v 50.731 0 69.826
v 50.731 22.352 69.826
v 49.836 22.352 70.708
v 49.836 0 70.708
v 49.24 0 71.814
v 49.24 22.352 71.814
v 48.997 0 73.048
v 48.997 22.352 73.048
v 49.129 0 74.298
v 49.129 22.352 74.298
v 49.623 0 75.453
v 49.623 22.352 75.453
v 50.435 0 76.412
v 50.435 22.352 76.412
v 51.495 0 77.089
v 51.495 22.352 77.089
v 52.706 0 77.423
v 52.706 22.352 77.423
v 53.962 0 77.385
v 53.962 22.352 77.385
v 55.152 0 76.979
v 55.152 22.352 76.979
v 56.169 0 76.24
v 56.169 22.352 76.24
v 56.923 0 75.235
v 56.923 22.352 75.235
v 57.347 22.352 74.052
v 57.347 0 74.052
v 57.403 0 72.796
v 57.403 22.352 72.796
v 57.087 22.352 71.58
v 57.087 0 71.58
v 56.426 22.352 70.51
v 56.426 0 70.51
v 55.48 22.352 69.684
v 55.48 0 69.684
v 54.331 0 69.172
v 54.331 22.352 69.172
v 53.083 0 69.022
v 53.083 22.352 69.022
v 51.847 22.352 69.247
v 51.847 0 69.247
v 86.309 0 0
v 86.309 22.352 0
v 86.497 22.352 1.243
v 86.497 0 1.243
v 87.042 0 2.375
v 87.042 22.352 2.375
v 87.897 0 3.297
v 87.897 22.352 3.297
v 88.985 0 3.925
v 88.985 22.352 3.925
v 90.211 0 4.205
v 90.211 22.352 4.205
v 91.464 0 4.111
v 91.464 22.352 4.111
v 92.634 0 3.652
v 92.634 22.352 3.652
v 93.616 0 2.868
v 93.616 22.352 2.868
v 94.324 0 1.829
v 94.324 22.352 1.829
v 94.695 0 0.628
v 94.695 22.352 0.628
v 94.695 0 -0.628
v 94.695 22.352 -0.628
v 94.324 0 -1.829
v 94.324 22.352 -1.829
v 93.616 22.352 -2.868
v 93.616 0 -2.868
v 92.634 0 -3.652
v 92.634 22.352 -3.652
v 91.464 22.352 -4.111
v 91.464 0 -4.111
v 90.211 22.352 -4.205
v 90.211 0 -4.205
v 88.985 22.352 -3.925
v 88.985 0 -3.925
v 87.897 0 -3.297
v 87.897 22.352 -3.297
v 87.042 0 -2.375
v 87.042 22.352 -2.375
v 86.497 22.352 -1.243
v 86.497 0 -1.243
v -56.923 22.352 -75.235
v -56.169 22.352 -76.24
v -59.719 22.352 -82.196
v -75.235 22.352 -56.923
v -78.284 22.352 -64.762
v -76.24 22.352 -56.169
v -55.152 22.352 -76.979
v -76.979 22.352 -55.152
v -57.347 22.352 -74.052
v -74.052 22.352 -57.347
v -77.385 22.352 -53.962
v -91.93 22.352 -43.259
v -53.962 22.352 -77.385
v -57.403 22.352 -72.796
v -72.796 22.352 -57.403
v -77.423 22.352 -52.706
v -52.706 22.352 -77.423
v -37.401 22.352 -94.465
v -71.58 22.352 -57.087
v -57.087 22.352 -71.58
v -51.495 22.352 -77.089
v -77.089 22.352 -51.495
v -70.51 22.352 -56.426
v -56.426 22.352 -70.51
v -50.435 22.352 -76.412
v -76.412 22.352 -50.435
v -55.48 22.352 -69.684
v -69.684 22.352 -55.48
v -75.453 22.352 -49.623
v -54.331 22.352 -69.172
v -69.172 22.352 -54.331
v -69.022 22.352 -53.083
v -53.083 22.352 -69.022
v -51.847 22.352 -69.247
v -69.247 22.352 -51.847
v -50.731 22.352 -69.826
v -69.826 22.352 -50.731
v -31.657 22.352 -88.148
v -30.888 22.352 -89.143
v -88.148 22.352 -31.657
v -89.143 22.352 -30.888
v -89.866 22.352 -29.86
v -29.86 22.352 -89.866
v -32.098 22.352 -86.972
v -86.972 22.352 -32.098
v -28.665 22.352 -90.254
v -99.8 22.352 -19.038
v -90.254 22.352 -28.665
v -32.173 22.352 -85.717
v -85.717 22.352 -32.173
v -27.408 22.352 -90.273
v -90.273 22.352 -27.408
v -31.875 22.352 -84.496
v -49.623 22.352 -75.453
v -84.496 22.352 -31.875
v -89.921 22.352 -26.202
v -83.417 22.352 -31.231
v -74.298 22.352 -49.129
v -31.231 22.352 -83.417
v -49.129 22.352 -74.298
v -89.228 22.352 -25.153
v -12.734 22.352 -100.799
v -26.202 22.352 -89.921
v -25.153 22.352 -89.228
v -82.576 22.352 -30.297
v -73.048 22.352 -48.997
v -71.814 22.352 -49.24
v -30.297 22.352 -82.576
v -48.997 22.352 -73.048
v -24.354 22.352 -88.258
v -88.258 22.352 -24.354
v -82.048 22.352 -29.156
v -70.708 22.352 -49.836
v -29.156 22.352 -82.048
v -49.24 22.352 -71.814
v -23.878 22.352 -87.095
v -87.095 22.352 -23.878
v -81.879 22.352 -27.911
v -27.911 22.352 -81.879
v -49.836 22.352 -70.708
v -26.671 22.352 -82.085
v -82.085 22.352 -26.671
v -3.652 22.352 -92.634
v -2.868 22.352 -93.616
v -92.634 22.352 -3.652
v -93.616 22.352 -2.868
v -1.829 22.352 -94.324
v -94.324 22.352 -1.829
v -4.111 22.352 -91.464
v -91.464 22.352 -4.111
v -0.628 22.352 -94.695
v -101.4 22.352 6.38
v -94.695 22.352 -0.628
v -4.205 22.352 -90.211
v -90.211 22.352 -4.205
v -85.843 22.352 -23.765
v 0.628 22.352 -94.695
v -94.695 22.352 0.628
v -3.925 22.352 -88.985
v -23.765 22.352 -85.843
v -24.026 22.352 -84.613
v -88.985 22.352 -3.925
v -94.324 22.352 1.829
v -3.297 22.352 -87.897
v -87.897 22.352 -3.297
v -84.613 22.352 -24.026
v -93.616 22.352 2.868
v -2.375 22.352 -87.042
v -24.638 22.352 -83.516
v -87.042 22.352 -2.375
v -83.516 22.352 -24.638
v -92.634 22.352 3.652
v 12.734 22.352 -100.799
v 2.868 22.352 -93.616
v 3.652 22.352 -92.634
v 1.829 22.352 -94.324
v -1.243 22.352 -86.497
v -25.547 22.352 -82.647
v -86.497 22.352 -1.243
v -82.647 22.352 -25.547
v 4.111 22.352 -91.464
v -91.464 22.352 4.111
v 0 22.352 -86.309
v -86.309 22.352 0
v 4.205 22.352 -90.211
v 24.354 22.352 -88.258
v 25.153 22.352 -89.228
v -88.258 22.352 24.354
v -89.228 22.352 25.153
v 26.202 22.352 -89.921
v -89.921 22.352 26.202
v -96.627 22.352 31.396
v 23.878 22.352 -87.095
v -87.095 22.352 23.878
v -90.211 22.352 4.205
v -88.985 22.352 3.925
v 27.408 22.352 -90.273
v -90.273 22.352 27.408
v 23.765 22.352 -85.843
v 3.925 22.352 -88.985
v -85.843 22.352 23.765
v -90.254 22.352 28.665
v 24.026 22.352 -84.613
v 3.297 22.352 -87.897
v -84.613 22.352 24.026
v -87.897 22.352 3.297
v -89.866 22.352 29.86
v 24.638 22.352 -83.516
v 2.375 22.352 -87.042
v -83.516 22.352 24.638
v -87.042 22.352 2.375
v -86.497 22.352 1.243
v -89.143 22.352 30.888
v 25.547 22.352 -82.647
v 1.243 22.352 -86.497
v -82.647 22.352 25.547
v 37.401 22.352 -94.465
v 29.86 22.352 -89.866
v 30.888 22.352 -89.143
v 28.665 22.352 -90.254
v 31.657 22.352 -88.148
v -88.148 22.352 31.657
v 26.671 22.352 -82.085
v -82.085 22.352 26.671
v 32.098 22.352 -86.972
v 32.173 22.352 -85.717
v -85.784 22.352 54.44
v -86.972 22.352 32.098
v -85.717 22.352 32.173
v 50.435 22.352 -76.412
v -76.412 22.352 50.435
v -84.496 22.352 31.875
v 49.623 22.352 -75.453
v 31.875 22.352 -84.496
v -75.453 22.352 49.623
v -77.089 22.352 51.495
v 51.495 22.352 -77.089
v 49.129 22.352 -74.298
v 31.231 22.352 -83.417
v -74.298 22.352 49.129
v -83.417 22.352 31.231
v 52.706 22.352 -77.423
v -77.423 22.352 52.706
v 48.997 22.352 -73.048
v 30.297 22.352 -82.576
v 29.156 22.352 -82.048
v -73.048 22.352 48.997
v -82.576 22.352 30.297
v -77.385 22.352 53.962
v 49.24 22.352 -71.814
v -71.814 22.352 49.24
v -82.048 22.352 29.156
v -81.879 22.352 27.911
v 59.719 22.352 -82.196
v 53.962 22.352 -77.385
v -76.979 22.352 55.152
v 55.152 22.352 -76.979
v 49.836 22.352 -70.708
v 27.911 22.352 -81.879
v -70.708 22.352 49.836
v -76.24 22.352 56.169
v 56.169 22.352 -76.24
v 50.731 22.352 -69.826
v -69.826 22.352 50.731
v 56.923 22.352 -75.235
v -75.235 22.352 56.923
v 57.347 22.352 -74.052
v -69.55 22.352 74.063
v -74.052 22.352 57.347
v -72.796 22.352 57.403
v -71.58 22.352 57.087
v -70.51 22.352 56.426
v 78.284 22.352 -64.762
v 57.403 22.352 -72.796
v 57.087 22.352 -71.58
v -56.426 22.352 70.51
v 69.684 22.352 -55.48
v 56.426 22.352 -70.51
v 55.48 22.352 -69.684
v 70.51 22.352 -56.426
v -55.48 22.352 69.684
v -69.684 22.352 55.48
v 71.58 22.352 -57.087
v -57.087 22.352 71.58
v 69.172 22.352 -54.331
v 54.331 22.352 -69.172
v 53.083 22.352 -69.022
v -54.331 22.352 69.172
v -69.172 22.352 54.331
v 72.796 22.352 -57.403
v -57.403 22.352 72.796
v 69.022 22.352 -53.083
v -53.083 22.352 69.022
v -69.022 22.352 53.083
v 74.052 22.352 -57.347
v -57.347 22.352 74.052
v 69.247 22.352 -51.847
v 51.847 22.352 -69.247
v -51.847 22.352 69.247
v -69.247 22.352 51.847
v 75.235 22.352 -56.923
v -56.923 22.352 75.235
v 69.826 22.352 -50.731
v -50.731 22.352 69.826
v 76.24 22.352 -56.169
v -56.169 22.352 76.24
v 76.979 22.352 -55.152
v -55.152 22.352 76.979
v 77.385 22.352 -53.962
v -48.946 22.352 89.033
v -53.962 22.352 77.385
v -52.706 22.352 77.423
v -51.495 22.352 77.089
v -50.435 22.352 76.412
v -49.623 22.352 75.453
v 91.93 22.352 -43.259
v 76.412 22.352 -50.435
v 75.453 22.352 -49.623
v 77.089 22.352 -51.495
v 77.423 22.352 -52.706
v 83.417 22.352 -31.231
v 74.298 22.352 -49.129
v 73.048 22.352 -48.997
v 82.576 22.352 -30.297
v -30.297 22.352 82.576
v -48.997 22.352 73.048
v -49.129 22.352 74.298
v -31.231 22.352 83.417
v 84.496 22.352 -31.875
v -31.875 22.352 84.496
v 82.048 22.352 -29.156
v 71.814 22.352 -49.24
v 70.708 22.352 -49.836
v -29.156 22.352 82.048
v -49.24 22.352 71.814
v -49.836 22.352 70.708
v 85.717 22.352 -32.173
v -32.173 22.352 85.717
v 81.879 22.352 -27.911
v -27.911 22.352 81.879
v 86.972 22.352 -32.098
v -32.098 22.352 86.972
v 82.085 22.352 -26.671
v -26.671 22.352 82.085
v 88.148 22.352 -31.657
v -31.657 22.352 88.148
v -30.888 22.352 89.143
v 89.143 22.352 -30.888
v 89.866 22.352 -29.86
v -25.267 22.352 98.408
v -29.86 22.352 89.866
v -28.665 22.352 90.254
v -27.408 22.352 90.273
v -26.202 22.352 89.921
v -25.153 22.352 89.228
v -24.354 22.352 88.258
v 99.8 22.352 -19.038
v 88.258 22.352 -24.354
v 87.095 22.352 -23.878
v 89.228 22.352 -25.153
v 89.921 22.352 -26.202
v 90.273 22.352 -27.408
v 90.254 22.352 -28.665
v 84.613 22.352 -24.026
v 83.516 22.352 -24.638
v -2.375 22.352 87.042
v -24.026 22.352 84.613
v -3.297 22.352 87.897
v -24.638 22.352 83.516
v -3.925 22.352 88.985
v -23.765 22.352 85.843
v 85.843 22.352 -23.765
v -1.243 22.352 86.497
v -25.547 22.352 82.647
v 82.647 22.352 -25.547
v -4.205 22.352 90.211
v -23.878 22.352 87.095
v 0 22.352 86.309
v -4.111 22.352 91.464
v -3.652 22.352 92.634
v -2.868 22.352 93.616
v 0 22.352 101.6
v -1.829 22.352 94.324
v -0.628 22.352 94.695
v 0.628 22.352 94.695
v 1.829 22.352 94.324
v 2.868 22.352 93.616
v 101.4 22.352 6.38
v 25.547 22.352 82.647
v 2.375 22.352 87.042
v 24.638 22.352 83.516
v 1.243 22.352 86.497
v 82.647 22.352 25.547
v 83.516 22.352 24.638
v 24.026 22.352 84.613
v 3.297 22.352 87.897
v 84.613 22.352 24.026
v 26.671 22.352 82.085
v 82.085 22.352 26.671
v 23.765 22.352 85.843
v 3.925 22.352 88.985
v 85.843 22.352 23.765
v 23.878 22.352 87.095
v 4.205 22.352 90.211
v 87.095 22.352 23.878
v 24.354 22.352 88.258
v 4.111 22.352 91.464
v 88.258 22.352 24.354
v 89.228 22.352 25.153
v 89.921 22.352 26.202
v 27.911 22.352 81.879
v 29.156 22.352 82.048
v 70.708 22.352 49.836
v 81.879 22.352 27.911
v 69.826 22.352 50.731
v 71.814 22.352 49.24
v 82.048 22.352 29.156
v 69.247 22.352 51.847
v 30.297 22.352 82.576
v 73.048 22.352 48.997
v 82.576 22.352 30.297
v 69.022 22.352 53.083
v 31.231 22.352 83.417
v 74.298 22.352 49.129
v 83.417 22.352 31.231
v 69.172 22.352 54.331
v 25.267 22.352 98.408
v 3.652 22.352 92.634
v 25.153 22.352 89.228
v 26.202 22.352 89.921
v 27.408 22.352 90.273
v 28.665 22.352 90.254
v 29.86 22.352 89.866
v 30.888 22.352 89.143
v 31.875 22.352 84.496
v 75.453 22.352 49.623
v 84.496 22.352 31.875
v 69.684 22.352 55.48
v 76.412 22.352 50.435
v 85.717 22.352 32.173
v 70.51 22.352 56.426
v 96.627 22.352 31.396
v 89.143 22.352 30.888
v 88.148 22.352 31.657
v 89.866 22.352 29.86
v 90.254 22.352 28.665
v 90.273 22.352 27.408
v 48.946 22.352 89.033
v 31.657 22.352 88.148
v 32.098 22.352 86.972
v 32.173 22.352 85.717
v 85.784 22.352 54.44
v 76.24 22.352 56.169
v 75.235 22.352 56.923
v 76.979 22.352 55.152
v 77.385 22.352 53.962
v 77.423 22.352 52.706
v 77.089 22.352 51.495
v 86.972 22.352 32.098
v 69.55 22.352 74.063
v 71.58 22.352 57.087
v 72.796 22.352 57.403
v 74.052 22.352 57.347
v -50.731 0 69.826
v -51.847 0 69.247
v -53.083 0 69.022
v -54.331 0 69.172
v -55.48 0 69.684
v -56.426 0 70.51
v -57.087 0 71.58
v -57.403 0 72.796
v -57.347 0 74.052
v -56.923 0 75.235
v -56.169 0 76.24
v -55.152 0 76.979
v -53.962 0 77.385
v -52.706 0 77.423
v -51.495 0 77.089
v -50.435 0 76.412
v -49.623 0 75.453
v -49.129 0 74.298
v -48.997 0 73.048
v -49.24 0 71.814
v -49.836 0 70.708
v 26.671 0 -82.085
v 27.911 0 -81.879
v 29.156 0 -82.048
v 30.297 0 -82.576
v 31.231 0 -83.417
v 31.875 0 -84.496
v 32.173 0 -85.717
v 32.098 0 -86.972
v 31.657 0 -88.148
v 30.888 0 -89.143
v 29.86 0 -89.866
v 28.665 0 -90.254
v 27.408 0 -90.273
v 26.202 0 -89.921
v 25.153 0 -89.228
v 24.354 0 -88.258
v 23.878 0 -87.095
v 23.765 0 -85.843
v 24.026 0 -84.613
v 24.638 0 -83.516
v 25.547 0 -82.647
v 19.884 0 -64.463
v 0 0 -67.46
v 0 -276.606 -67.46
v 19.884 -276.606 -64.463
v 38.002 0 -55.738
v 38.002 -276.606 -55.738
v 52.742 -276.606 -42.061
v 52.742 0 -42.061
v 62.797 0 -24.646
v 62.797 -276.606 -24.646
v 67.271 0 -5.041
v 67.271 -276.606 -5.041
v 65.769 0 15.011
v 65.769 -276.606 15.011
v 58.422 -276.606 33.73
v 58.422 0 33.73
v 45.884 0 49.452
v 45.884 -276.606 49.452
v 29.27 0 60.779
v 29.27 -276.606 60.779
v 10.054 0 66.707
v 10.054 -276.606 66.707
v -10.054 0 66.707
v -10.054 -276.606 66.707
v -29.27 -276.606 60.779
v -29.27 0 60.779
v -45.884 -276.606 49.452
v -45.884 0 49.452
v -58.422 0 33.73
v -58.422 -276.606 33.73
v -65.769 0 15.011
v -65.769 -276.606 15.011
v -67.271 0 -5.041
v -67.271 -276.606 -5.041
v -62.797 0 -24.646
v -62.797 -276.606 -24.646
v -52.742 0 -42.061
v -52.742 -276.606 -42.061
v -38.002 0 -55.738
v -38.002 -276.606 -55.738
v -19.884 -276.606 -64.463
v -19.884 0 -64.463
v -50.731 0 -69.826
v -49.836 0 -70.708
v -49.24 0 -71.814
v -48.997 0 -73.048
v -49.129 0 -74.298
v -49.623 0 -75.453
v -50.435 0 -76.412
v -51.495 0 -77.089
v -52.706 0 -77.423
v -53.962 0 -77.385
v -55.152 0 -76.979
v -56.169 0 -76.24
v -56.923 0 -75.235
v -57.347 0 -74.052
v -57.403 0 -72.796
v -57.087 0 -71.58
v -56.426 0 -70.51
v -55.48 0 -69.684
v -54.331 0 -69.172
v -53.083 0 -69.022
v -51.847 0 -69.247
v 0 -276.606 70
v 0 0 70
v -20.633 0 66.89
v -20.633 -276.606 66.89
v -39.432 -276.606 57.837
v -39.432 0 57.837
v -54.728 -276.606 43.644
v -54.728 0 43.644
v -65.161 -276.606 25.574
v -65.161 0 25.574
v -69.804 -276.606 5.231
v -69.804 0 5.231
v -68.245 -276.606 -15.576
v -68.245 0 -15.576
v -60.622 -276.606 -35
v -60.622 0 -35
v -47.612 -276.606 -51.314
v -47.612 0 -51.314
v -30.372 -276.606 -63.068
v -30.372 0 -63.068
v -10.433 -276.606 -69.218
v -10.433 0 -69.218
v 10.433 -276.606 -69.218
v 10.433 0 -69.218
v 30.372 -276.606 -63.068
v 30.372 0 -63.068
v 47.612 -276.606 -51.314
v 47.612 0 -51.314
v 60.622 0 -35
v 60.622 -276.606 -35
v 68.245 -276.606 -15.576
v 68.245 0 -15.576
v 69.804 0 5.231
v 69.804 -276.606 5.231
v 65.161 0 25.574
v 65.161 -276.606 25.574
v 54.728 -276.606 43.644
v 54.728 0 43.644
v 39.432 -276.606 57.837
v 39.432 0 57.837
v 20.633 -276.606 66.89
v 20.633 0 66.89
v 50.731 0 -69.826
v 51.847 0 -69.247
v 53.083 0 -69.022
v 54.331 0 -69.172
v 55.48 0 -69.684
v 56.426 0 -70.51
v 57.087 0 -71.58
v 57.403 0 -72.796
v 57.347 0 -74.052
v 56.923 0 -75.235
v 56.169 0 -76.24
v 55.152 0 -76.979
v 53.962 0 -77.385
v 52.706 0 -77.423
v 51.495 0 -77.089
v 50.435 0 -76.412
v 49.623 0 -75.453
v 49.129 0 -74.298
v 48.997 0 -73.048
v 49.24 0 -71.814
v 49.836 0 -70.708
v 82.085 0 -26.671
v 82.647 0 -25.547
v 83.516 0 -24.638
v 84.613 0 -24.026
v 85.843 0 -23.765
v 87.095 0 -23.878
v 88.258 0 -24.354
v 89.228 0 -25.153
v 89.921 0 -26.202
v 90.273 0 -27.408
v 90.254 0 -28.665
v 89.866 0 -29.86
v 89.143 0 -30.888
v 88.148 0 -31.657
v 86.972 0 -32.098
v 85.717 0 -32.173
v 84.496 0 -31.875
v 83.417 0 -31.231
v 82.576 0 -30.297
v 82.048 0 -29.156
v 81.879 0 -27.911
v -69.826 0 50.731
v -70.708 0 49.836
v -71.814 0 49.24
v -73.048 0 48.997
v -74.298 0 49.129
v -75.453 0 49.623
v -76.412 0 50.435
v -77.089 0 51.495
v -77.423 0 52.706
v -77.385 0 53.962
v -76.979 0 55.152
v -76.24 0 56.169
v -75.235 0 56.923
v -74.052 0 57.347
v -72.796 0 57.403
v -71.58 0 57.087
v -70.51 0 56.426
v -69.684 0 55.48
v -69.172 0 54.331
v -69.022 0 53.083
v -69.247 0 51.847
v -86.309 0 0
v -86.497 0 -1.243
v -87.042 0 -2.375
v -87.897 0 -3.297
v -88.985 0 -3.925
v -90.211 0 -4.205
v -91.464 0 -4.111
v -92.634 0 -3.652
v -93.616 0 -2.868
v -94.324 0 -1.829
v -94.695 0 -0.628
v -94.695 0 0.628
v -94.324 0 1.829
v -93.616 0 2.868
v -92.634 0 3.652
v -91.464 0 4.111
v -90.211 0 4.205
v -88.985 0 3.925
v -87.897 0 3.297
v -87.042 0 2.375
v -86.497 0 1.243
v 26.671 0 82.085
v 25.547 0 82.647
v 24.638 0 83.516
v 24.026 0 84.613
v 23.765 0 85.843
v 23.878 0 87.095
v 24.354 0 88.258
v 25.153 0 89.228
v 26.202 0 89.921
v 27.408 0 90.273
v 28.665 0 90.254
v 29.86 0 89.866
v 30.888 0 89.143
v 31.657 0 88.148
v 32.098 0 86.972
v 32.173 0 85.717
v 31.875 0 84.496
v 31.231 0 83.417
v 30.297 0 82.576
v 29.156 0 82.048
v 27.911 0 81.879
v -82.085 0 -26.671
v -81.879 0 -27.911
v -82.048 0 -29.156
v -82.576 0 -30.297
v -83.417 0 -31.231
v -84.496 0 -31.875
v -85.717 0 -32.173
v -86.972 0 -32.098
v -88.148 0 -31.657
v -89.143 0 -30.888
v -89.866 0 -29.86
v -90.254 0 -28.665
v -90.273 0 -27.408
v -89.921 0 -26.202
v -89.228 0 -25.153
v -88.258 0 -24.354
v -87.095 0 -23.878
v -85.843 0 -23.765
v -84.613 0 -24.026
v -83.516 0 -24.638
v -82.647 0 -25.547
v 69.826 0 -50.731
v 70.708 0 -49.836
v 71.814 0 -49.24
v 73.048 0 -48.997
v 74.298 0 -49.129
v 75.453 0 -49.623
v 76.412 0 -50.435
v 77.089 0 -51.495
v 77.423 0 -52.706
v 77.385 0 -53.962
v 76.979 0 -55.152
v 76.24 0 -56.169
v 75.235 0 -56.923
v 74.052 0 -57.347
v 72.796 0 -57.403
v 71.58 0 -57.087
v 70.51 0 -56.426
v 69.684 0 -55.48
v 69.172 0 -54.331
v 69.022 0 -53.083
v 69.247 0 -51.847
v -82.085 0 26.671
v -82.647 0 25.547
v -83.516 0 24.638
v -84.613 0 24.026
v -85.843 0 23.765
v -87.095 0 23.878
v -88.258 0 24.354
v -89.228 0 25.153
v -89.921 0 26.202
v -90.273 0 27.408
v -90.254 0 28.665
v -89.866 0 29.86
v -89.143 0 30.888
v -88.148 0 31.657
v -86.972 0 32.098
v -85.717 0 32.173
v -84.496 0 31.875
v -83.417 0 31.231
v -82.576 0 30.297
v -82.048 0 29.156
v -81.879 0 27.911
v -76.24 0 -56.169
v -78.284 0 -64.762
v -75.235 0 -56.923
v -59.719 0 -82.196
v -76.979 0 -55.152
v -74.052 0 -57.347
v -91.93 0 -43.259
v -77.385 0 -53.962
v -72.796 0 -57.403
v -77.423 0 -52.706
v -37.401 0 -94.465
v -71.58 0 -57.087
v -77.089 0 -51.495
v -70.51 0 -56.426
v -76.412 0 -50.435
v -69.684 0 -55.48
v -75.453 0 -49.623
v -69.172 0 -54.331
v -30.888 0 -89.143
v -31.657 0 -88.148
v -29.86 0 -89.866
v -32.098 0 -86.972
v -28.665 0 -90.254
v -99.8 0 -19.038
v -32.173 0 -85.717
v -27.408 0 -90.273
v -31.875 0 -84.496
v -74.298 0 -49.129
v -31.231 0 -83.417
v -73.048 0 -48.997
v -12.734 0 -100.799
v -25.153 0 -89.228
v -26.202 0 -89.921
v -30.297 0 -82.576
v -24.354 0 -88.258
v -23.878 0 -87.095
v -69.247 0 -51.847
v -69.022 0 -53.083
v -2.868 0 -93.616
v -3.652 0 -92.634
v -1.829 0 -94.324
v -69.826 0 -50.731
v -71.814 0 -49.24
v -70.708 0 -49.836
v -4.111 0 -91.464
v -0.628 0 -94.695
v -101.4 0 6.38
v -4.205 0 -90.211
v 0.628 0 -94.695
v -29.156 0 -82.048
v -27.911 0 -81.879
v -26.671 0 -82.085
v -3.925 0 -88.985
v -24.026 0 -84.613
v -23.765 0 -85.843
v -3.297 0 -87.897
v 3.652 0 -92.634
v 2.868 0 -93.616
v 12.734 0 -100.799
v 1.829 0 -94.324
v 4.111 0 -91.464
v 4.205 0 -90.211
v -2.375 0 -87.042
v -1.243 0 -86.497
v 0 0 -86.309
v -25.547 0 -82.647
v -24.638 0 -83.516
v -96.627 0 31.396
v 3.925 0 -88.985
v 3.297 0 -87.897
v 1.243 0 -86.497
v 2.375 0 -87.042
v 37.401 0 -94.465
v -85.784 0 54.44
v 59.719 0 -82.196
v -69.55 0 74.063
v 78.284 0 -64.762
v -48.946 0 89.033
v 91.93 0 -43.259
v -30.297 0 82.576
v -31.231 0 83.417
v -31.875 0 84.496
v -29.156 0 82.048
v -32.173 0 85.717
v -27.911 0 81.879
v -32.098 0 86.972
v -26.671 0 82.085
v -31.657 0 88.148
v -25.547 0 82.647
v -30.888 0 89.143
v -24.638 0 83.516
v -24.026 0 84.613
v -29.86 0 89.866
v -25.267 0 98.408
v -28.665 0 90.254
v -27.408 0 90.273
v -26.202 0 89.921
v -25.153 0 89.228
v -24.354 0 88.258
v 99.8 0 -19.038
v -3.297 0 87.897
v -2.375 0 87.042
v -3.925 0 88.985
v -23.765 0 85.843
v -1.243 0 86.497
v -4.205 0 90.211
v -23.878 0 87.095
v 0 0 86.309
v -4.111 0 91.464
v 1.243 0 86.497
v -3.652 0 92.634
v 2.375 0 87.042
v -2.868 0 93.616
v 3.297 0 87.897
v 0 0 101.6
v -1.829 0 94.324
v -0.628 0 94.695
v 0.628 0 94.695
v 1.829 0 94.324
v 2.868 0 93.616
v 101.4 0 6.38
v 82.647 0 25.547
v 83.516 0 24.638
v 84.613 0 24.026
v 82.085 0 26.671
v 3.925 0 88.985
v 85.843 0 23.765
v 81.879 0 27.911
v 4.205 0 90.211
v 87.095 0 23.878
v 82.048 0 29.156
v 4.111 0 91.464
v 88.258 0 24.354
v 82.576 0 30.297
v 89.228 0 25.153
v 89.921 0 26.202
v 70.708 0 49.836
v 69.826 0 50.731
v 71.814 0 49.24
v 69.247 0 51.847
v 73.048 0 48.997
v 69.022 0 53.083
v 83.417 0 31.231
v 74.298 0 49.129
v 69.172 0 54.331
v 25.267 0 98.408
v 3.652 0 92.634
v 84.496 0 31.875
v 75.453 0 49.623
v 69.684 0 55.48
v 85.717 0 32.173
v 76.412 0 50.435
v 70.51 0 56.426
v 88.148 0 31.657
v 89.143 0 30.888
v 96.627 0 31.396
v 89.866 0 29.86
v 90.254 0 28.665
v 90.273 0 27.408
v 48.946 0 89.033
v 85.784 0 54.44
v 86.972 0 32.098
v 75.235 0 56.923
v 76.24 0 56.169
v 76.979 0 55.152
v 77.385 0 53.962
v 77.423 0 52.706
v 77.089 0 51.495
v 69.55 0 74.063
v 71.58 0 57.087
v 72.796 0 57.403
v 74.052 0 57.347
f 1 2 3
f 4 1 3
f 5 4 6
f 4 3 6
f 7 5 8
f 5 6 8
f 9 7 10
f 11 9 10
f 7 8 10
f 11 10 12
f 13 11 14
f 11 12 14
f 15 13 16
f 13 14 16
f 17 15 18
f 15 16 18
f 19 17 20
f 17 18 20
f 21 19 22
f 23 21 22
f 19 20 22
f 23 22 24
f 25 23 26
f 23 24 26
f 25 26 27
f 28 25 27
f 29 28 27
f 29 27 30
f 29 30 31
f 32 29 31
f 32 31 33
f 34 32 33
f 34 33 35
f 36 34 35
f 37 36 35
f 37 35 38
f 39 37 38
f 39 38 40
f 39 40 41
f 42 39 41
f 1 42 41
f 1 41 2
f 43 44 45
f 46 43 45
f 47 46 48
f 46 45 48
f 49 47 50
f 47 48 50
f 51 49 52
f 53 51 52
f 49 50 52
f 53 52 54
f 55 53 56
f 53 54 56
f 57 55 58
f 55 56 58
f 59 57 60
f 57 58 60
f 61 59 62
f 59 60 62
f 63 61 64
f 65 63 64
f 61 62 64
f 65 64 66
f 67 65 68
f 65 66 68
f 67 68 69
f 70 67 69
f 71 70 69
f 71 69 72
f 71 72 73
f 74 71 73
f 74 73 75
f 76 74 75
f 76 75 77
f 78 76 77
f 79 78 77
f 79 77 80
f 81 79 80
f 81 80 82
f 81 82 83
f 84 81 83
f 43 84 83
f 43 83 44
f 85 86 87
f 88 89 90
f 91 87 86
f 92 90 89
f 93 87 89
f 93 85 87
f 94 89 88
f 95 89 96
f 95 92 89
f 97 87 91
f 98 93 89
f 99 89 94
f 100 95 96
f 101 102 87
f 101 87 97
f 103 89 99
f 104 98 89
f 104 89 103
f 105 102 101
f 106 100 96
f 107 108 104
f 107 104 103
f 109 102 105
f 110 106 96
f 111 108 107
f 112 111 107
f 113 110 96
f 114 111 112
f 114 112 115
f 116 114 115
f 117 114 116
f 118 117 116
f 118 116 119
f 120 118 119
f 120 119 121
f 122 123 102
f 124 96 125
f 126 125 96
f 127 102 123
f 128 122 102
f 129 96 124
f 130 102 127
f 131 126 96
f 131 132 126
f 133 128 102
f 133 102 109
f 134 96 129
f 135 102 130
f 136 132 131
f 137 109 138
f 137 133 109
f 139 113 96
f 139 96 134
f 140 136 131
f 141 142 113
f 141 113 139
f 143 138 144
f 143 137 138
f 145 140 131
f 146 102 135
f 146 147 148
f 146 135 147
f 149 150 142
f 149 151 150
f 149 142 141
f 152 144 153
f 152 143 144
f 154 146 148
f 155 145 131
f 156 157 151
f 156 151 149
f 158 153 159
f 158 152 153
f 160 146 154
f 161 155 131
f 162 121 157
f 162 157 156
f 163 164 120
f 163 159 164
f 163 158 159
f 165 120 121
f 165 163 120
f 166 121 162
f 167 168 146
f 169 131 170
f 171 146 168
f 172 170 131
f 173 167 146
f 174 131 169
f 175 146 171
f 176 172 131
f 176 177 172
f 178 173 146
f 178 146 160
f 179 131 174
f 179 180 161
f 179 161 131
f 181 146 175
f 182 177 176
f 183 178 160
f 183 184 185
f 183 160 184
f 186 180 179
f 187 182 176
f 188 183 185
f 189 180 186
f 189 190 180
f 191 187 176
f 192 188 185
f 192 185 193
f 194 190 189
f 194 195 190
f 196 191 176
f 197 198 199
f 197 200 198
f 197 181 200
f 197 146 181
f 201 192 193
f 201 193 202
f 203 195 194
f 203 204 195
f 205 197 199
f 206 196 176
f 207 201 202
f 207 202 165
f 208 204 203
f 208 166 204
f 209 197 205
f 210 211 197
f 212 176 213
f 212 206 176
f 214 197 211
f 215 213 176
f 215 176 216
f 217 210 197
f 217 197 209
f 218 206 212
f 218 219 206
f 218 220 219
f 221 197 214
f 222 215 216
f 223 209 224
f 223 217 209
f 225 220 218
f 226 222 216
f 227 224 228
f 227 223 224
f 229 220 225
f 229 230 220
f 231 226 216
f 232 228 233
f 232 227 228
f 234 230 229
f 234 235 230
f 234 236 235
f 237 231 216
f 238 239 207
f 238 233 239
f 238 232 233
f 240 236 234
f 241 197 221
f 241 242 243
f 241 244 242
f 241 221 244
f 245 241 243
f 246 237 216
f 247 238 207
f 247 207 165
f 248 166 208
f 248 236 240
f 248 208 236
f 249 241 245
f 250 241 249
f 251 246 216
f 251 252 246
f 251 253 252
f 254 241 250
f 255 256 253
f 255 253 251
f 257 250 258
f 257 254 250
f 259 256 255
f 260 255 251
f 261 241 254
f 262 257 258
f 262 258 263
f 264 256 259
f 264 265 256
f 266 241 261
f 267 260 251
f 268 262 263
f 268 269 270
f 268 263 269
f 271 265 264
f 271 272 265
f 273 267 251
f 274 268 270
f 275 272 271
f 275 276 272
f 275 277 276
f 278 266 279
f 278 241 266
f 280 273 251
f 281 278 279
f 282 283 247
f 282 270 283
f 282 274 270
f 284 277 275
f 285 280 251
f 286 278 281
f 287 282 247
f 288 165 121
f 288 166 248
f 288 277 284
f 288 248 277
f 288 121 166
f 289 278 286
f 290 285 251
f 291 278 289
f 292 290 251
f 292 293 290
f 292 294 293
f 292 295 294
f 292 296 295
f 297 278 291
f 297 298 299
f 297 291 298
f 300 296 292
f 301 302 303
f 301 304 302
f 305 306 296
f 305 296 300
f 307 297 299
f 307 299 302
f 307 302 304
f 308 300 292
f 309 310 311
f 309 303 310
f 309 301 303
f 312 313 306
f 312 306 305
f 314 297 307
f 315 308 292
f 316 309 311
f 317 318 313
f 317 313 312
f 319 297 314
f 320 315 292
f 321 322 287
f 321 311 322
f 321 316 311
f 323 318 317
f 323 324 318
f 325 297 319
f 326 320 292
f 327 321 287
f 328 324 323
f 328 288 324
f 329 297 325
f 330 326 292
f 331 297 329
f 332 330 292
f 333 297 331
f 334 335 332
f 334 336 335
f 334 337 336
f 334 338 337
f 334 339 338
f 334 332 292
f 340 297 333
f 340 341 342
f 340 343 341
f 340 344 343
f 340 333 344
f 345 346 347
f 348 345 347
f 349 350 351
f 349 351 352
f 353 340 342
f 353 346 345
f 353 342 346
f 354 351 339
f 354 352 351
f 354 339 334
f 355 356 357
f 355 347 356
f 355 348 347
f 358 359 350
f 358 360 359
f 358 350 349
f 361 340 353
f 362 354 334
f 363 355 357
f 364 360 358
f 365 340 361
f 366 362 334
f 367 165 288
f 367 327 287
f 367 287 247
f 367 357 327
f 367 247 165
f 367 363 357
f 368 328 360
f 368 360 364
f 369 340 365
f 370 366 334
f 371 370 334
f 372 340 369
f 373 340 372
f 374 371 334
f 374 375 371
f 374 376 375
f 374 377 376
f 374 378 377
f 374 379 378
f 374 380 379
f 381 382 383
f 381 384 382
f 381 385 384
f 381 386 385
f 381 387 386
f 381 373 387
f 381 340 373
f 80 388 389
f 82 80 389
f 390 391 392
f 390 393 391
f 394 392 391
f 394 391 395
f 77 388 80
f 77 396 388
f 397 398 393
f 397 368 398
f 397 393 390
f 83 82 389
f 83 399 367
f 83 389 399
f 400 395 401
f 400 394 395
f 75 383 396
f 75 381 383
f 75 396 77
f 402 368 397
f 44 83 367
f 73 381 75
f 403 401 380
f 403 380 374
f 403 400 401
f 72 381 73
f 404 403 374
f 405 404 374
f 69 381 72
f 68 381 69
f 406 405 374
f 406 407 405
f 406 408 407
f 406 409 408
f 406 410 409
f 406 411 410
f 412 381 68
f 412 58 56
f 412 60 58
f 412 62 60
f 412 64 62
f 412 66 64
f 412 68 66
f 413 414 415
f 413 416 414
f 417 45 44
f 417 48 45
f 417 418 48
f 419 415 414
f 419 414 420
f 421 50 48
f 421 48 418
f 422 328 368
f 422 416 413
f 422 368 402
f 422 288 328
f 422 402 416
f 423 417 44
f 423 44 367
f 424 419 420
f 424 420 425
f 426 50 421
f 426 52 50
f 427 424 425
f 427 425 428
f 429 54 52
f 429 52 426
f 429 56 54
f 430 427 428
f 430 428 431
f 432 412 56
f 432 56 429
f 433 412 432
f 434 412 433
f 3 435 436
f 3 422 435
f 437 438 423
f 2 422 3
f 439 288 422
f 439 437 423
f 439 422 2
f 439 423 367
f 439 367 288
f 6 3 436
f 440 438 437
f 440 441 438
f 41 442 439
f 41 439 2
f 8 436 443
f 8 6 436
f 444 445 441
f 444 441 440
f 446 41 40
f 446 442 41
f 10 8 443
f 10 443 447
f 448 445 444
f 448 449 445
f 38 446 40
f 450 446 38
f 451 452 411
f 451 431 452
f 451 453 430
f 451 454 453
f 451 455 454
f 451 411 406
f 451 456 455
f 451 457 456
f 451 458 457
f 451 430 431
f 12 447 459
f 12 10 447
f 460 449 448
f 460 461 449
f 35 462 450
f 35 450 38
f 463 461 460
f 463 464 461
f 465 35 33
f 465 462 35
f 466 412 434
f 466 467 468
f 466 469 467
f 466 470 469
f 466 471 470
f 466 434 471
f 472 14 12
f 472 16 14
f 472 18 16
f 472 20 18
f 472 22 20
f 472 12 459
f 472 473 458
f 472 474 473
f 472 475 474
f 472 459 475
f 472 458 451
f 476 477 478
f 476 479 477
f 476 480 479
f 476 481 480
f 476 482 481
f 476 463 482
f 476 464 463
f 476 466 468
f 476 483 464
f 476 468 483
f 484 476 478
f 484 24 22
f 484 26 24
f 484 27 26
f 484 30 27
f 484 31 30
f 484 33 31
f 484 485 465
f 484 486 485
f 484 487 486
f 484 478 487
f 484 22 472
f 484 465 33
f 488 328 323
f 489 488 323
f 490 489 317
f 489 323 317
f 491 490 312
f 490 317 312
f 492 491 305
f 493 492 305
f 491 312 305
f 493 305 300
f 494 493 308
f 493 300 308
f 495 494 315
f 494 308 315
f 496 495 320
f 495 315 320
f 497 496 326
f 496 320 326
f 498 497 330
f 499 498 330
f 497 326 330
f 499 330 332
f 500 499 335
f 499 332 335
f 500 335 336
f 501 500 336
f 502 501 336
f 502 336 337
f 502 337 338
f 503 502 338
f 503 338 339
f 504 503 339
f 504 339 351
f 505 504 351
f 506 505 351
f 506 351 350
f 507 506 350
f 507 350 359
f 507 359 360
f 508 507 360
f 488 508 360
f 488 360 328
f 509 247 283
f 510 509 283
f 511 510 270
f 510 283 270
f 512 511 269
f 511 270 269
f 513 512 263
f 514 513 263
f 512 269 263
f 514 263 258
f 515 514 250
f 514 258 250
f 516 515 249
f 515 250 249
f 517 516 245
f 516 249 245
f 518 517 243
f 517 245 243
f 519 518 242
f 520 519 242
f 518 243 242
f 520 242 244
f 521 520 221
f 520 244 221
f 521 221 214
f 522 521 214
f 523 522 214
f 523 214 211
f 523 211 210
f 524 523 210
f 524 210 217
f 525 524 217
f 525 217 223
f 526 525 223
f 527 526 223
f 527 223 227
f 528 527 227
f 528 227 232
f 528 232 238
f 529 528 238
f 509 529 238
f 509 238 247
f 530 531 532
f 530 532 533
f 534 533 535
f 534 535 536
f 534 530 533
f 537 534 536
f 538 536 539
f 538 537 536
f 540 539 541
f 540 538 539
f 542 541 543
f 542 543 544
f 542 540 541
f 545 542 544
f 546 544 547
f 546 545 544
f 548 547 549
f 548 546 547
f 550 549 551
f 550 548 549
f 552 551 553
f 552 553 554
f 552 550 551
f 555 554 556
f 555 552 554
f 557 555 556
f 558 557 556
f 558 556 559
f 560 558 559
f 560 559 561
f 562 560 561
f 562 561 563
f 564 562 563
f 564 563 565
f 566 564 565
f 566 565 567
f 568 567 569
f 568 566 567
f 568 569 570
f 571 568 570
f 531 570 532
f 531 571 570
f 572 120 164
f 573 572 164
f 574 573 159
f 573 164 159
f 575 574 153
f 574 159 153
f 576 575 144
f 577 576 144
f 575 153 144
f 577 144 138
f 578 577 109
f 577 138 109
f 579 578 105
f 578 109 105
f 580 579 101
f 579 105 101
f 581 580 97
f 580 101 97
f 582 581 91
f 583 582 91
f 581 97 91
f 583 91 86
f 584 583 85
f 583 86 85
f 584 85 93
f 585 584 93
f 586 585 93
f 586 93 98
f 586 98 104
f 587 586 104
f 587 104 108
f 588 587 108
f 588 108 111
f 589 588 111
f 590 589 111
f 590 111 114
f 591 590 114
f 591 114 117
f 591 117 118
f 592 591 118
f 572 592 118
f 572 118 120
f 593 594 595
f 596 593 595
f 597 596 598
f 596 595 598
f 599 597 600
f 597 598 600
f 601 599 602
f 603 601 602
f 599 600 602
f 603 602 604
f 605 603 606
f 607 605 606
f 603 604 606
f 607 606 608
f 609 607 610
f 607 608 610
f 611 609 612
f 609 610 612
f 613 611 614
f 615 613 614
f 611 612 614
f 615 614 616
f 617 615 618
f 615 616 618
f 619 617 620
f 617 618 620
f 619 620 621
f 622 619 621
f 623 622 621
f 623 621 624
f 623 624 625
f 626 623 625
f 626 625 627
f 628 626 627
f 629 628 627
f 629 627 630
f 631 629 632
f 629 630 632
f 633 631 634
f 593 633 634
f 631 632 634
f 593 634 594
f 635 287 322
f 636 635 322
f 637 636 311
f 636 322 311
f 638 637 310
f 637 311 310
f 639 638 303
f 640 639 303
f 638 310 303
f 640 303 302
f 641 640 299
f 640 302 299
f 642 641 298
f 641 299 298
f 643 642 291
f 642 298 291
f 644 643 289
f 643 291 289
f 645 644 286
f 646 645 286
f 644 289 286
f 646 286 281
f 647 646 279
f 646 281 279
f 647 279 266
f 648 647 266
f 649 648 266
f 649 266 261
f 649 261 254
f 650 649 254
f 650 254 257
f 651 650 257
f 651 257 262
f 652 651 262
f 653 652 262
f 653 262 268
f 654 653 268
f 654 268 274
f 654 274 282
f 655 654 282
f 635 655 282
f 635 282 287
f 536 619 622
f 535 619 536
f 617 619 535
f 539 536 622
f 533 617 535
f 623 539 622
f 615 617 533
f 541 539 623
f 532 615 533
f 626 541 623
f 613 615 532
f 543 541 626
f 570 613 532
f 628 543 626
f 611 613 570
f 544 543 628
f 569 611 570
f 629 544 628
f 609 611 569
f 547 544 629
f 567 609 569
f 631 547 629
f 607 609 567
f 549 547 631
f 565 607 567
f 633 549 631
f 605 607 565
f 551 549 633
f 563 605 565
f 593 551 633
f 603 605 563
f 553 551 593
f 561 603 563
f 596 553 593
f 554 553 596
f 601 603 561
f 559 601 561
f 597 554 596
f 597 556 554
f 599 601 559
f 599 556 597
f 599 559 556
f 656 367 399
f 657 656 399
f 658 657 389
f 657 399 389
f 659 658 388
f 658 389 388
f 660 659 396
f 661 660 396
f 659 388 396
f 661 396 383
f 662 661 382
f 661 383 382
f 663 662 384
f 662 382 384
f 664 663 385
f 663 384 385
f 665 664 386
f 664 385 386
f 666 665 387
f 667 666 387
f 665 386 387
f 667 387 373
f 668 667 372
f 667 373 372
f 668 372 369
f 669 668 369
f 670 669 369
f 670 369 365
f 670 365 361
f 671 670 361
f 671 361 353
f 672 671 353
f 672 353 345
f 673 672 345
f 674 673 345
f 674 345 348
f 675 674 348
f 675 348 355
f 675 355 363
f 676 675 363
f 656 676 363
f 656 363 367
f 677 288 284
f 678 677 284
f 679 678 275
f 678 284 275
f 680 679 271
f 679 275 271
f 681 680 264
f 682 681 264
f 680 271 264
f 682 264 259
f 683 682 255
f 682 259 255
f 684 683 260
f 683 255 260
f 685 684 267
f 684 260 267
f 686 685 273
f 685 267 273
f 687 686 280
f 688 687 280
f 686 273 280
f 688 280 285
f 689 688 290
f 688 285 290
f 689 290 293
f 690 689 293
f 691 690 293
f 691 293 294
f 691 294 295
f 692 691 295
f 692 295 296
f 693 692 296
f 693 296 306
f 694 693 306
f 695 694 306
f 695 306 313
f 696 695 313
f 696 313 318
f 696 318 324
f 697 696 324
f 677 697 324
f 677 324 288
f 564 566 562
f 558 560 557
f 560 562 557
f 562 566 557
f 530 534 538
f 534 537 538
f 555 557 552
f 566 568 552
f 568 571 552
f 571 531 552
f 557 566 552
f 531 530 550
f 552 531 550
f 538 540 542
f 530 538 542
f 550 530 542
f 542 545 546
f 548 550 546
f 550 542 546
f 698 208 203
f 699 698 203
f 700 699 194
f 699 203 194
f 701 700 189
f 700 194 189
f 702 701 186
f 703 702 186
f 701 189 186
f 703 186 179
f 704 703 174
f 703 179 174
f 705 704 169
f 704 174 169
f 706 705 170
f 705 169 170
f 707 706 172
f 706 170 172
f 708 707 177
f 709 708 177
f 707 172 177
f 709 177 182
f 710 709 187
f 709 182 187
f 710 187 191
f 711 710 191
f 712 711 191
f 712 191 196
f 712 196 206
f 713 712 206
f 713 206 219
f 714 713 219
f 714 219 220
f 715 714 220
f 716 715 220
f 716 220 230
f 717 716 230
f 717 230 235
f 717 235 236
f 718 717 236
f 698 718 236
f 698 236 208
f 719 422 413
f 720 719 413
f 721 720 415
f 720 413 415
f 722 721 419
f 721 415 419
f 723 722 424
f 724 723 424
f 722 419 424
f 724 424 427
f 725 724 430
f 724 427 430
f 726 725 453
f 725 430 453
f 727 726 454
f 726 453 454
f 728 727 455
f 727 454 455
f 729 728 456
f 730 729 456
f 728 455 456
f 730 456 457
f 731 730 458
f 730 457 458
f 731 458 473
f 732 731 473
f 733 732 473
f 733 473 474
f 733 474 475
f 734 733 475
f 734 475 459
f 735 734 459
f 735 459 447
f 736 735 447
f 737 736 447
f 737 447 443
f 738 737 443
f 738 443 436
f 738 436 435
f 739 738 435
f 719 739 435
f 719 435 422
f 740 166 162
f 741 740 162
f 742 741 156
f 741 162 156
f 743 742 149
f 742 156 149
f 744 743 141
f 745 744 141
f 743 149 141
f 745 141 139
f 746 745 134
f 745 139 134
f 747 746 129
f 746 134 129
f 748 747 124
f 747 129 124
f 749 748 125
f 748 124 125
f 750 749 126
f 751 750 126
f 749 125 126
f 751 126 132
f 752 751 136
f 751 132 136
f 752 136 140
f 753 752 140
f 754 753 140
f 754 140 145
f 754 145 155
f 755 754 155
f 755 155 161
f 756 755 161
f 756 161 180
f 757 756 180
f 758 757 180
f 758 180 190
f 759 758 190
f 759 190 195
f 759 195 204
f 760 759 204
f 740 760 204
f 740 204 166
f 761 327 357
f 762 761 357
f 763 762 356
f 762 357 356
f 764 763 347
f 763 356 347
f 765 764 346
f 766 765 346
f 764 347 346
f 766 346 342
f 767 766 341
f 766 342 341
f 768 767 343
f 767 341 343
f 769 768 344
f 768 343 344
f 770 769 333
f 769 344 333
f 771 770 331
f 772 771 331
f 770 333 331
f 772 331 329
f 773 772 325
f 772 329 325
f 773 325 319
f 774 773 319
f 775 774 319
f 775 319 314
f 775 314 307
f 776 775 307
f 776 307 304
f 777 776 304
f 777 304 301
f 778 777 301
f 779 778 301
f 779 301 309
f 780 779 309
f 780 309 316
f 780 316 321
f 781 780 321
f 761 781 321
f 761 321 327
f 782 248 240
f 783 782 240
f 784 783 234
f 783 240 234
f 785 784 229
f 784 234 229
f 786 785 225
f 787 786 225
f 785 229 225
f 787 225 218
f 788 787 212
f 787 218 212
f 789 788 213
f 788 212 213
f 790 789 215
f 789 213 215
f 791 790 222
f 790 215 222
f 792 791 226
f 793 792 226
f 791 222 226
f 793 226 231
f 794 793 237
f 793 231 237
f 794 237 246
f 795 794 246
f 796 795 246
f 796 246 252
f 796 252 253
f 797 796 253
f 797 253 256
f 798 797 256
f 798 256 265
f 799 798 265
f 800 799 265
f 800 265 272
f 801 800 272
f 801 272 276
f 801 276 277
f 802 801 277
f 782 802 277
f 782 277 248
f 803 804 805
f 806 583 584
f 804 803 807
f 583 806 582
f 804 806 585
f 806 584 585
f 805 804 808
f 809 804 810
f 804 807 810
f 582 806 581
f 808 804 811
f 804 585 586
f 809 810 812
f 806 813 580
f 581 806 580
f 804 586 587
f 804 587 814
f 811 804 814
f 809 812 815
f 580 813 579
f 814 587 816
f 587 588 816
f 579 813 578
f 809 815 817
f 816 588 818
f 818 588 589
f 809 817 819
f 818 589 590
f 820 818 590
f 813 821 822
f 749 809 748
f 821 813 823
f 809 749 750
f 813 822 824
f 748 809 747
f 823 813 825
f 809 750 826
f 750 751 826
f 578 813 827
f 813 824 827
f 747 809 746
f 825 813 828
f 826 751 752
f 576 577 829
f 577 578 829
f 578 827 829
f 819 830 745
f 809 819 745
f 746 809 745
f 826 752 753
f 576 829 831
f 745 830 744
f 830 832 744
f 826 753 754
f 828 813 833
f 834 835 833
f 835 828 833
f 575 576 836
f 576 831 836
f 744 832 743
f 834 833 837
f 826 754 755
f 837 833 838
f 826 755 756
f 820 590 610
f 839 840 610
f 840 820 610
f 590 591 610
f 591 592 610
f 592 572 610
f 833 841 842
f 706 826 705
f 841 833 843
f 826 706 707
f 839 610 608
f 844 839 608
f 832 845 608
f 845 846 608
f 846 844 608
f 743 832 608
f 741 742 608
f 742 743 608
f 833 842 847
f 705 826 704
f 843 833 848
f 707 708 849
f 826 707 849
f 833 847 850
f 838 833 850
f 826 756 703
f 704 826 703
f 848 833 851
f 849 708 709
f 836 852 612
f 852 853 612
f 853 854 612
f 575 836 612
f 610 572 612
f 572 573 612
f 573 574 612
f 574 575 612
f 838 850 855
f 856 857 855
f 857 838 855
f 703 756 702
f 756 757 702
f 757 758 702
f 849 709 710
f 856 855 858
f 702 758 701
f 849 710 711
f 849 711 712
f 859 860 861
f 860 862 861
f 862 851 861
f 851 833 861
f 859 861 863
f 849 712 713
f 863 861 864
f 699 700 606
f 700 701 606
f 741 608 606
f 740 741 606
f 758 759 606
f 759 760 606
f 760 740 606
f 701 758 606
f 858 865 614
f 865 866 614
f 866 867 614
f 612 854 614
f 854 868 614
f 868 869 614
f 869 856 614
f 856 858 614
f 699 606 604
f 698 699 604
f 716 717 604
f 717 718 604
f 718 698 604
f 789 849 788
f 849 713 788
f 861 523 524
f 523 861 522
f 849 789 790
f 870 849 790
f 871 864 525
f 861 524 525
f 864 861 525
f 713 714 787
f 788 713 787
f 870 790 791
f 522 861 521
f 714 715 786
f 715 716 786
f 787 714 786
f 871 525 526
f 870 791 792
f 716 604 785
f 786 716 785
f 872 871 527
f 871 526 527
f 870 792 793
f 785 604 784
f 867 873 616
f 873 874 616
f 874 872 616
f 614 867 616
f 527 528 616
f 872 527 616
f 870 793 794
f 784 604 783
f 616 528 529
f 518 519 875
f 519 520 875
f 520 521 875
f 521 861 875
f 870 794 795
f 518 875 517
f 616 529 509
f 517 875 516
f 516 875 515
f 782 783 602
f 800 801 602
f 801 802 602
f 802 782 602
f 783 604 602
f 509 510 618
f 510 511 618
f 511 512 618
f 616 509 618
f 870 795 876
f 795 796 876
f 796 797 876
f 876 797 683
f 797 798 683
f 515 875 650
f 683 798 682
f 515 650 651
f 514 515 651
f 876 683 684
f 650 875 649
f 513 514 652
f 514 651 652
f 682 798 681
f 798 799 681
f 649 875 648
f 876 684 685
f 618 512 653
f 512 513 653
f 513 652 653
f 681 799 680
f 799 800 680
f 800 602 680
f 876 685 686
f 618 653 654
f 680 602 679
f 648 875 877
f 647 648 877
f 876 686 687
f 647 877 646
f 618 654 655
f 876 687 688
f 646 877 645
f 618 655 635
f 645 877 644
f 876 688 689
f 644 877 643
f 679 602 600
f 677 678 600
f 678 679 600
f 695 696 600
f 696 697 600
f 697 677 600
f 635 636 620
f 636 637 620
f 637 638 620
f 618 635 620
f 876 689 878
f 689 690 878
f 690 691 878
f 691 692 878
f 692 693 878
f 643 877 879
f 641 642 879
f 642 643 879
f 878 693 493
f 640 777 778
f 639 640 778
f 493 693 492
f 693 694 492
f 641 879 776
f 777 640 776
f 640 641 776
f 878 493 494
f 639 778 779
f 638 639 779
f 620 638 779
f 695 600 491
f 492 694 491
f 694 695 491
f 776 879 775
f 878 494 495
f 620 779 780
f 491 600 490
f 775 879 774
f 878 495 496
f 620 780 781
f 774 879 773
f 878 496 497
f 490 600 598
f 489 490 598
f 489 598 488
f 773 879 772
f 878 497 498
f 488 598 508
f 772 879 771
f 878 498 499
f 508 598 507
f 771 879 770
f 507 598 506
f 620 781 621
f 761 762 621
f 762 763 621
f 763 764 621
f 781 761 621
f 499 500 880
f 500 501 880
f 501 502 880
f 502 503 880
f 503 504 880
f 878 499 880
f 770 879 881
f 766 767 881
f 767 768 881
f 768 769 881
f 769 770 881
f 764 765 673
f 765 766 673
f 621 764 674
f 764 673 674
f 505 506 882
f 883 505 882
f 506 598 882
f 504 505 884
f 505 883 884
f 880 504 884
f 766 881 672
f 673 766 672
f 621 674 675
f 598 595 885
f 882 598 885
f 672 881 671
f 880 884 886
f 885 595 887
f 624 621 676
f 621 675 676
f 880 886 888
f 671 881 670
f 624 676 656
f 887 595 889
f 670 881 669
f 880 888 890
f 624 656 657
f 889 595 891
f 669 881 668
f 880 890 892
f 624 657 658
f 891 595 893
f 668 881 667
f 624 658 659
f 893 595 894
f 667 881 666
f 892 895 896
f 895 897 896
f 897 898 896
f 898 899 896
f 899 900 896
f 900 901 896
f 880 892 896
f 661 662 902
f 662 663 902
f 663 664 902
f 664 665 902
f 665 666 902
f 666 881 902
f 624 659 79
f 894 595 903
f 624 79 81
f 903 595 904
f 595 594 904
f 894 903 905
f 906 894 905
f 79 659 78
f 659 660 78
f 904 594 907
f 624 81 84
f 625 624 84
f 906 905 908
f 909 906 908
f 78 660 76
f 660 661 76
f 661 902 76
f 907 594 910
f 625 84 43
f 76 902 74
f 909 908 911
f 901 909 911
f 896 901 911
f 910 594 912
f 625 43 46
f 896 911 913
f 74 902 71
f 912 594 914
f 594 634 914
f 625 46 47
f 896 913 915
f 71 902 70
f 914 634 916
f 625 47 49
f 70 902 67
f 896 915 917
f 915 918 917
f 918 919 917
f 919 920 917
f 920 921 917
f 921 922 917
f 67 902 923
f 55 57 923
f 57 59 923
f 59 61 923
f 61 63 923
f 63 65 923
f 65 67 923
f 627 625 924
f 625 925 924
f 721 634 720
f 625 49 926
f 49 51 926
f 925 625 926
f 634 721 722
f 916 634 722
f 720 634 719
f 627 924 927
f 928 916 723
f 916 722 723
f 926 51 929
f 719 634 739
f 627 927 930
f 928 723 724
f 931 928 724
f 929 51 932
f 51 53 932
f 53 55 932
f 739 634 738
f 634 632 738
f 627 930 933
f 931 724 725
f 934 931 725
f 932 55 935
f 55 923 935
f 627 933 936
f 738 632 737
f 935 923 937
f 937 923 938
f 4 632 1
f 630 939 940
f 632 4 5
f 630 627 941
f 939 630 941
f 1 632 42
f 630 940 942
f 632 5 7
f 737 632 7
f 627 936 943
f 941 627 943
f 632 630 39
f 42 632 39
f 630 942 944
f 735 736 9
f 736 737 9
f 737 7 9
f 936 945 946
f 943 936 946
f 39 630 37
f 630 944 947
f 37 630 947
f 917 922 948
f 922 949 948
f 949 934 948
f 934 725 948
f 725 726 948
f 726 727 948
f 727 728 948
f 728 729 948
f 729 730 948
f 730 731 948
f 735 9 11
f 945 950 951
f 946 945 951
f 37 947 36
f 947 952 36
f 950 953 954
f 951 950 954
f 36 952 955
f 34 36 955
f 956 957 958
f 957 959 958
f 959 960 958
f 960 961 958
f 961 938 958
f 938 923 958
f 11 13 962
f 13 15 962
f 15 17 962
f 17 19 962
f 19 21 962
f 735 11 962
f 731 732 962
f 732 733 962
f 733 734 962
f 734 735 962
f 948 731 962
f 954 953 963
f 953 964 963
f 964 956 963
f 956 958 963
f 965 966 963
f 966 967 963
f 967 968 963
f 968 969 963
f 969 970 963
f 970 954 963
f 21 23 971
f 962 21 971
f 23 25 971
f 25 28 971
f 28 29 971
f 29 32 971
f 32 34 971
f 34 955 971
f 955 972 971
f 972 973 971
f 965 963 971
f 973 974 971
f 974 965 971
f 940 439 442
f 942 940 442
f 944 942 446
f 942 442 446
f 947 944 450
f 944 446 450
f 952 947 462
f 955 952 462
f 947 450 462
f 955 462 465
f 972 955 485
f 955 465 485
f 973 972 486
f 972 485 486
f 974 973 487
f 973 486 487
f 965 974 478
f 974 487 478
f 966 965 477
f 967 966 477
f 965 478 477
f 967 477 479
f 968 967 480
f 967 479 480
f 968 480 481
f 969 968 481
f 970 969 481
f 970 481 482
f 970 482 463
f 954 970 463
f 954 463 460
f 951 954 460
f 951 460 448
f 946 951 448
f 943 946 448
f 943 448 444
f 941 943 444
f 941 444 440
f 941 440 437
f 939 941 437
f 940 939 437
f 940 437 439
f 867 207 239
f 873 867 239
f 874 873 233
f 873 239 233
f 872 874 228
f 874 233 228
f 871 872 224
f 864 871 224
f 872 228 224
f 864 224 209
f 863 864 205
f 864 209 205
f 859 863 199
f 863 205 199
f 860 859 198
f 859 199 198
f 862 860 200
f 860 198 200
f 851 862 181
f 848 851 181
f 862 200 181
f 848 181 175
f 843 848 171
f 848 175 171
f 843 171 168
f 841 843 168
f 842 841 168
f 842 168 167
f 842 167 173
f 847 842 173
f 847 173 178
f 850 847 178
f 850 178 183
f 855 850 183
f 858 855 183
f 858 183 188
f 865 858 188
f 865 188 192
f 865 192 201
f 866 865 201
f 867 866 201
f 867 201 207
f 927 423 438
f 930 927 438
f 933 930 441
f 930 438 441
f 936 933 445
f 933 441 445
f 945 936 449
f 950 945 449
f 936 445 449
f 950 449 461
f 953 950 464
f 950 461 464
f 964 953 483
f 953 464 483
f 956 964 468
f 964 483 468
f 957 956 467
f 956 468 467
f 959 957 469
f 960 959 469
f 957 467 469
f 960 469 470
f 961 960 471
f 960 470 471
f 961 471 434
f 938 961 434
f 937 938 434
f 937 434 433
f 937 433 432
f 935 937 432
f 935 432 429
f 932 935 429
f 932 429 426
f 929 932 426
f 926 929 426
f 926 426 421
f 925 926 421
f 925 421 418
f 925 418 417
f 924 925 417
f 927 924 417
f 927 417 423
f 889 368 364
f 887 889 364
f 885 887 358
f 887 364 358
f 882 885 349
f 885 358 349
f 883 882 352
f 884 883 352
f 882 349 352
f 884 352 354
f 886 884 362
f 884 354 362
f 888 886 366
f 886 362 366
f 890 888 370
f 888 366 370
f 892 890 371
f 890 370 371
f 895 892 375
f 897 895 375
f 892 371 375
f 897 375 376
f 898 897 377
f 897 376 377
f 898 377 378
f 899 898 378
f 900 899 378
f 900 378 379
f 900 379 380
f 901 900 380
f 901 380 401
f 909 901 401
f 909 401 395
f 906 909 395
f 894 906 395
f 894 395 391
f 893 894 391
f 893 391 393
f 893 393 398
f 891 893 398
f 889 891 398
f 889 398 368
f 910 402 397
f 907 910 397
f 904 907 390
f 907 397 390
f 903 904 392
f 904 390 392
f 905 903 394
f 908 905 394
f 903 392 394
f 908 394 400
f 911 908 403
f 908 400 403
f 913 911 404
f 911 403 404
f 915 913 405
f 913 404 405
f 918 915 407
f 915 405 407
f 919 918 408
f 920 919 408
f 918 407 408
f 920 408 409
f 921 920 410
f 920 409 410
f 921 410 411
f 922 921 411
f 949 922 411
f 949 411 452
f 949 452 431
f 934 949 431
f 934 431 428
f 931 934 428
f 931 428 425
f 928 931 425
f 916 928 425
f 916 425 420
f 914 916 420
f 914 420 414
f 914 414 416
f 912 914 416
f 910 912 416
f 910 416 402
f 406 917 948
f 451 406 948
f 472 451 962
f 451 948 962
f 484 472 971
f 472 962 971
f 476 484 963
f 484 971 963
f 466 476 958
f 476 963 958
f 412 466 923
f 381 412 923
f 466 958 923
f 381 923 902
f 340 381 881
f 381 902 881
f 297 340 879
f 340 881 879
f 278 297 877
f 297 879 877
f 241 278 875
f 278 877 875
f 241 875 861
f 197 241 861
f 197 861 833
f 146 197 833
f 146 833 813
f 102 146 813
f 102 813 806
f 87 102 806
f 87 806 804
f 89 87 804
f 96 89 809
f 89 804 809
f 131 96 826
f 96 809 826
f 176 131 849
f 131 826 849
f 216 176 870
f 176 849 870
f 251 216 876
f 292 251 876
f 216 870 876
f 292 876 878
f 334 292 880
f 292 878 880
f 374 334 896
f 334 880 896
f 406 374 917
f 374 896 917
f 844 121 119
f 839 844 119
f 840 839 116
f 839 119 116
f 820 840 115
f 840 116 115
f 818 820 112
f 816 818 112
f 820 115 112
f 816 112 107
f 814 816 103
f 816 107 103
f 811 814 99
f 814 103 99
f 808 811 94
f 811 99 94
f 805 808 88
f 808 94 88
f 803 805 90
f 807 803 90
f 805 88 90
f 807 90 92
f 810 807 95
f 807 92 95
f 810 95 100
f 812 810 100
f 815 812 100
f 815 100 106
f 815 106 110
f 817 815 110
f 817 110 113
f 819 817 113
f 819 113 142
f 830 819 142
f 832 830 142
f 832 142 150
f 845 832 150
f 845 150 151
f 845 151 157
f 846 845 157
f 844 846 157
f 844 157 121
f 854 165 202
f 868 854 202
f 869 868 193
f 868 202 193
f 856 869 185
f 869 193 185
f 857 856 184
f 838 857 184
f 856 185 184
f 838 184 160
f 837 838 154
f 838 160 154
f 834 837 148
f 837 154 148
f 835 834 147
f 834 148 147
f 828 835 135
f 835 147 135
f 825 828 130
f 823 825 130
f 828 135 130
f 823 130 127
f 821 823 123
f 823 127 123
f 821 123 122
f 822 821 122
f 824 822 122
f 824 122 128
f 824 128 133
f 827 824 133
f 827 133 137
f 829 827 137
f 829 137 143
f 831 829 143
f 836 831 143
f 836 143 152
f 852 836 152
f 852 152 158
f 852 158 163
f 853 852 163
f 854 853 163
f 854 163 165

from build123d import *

# Parameters (mm, degrees)
SKETCH1_R         = 101.6
EXTRUDE1_DEPTH    = 22.352
SKETCH5_R         = 70
SKETCH5_R_2       = 67.46
EXTRUDE2_DEPTH    = 276.606
SKETCH6_R         = 4.2164
EXTRUDE3_DEPTH    = 332.694144905
CIRPATTERN1_COUNT = 20


with BuildPart() as part:
    # Sketch1 → Extrude1 (new body)
    with BuildSketch(Plane(origin=(0, 0, 0), x_dir=(1, 0, 0), z_dir=(0, 1, 0))):
        with Locations(Location((0, 0, 0), (0, 0, 270))):
            Circle(SKETCH1_R)
    extrude(amount=EXTRUDE1_DEPTH)

    # Sketch5 → Extrude2 (add)
    with BuildSketch(Plane.XZ):
        with Locations(Location((0, 0, 0), (0, 0, 90))):
            Circle(SKETCH5_R)
        with Locations(Location((0, 0, 0), (0, 0, 270))):
            Circle(SKETCH5_R_2, mode=Mode.SUBTRACT)
    extrude(amount=EXTRUDE2_DEPTH)

    # Sketch6 → Extrude3 (cut, through all)
    with BuildSketch(Plane(origin=(0, 22.352, 0), x_dir=(1, 0, 0), z_dir=(0, 1, 0))):
        with Locations(Location((0, 90.5256, 0), (0, 0, 270))):
            Circle(SKETCH6_R)
    extrude3 = extrude(amount=-EXTRUDE3_DEPTH, mode=Mode.SUBTRACT)

    # CirPattern1: Extrude3 ×20 about axis
    cirpattern1_axis = Axis((0, 0, 0), (0, 1, 0))
    for i in range(1, CIRPATTERN1_COUNT):
        add(extrude3.rotate(cirpattern1_axis, i * 360 / CIRPATTERN1_COUNT), mode=Mode.SUBTRACT)


solid = part.part
